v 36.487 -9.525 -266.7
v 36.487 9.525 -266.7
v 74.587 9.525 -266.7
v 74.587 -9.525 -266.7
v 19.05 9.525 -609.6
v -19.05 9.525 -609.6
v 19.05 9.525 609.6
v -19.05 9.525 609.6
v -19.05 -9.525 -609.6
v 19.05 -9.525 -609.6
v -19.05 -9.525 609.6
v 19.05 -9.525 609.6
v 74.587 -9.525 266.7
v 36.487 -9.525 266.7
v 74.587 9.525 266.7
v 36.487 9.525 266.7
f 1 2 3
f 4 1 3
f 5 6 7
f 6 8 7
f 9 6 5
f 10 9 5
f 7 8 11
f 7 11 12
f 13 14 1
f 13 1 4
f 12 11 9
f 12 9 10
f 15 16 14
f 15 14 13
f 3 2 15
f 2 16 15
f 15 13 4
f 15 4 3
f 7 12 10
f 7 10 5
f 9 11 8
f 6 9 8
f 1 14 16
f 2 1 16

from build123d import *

# Parameters (mm, degrees)
F0_W     = 38.1
F0_H     = 19.05
F1_DEPTH = 609.6
F2_W     = 38.1
F2_H     = 19.05
F3_DEPTH = 266.7


with BuildPart() as f1:
    # F0 (on Top) → F1 (new body, symmetric)
    with BuildSketch(Plane.XY):
        Rectangle(F0_W, F0_H)
    extrude(amount=F1_DEPTH, both=True)


with BuildPart() as f3:
    # F2 (on Top) → F3 (new body, symmetric)
    with BuildSketch(Plane.XY):
        with Locations((55.536899, 0)):
            Rectangle(F2_W, F2_H)
    extrude(amount=F3_DEPTH, both=True)


solid = Compound([f1.part, f3.part])
